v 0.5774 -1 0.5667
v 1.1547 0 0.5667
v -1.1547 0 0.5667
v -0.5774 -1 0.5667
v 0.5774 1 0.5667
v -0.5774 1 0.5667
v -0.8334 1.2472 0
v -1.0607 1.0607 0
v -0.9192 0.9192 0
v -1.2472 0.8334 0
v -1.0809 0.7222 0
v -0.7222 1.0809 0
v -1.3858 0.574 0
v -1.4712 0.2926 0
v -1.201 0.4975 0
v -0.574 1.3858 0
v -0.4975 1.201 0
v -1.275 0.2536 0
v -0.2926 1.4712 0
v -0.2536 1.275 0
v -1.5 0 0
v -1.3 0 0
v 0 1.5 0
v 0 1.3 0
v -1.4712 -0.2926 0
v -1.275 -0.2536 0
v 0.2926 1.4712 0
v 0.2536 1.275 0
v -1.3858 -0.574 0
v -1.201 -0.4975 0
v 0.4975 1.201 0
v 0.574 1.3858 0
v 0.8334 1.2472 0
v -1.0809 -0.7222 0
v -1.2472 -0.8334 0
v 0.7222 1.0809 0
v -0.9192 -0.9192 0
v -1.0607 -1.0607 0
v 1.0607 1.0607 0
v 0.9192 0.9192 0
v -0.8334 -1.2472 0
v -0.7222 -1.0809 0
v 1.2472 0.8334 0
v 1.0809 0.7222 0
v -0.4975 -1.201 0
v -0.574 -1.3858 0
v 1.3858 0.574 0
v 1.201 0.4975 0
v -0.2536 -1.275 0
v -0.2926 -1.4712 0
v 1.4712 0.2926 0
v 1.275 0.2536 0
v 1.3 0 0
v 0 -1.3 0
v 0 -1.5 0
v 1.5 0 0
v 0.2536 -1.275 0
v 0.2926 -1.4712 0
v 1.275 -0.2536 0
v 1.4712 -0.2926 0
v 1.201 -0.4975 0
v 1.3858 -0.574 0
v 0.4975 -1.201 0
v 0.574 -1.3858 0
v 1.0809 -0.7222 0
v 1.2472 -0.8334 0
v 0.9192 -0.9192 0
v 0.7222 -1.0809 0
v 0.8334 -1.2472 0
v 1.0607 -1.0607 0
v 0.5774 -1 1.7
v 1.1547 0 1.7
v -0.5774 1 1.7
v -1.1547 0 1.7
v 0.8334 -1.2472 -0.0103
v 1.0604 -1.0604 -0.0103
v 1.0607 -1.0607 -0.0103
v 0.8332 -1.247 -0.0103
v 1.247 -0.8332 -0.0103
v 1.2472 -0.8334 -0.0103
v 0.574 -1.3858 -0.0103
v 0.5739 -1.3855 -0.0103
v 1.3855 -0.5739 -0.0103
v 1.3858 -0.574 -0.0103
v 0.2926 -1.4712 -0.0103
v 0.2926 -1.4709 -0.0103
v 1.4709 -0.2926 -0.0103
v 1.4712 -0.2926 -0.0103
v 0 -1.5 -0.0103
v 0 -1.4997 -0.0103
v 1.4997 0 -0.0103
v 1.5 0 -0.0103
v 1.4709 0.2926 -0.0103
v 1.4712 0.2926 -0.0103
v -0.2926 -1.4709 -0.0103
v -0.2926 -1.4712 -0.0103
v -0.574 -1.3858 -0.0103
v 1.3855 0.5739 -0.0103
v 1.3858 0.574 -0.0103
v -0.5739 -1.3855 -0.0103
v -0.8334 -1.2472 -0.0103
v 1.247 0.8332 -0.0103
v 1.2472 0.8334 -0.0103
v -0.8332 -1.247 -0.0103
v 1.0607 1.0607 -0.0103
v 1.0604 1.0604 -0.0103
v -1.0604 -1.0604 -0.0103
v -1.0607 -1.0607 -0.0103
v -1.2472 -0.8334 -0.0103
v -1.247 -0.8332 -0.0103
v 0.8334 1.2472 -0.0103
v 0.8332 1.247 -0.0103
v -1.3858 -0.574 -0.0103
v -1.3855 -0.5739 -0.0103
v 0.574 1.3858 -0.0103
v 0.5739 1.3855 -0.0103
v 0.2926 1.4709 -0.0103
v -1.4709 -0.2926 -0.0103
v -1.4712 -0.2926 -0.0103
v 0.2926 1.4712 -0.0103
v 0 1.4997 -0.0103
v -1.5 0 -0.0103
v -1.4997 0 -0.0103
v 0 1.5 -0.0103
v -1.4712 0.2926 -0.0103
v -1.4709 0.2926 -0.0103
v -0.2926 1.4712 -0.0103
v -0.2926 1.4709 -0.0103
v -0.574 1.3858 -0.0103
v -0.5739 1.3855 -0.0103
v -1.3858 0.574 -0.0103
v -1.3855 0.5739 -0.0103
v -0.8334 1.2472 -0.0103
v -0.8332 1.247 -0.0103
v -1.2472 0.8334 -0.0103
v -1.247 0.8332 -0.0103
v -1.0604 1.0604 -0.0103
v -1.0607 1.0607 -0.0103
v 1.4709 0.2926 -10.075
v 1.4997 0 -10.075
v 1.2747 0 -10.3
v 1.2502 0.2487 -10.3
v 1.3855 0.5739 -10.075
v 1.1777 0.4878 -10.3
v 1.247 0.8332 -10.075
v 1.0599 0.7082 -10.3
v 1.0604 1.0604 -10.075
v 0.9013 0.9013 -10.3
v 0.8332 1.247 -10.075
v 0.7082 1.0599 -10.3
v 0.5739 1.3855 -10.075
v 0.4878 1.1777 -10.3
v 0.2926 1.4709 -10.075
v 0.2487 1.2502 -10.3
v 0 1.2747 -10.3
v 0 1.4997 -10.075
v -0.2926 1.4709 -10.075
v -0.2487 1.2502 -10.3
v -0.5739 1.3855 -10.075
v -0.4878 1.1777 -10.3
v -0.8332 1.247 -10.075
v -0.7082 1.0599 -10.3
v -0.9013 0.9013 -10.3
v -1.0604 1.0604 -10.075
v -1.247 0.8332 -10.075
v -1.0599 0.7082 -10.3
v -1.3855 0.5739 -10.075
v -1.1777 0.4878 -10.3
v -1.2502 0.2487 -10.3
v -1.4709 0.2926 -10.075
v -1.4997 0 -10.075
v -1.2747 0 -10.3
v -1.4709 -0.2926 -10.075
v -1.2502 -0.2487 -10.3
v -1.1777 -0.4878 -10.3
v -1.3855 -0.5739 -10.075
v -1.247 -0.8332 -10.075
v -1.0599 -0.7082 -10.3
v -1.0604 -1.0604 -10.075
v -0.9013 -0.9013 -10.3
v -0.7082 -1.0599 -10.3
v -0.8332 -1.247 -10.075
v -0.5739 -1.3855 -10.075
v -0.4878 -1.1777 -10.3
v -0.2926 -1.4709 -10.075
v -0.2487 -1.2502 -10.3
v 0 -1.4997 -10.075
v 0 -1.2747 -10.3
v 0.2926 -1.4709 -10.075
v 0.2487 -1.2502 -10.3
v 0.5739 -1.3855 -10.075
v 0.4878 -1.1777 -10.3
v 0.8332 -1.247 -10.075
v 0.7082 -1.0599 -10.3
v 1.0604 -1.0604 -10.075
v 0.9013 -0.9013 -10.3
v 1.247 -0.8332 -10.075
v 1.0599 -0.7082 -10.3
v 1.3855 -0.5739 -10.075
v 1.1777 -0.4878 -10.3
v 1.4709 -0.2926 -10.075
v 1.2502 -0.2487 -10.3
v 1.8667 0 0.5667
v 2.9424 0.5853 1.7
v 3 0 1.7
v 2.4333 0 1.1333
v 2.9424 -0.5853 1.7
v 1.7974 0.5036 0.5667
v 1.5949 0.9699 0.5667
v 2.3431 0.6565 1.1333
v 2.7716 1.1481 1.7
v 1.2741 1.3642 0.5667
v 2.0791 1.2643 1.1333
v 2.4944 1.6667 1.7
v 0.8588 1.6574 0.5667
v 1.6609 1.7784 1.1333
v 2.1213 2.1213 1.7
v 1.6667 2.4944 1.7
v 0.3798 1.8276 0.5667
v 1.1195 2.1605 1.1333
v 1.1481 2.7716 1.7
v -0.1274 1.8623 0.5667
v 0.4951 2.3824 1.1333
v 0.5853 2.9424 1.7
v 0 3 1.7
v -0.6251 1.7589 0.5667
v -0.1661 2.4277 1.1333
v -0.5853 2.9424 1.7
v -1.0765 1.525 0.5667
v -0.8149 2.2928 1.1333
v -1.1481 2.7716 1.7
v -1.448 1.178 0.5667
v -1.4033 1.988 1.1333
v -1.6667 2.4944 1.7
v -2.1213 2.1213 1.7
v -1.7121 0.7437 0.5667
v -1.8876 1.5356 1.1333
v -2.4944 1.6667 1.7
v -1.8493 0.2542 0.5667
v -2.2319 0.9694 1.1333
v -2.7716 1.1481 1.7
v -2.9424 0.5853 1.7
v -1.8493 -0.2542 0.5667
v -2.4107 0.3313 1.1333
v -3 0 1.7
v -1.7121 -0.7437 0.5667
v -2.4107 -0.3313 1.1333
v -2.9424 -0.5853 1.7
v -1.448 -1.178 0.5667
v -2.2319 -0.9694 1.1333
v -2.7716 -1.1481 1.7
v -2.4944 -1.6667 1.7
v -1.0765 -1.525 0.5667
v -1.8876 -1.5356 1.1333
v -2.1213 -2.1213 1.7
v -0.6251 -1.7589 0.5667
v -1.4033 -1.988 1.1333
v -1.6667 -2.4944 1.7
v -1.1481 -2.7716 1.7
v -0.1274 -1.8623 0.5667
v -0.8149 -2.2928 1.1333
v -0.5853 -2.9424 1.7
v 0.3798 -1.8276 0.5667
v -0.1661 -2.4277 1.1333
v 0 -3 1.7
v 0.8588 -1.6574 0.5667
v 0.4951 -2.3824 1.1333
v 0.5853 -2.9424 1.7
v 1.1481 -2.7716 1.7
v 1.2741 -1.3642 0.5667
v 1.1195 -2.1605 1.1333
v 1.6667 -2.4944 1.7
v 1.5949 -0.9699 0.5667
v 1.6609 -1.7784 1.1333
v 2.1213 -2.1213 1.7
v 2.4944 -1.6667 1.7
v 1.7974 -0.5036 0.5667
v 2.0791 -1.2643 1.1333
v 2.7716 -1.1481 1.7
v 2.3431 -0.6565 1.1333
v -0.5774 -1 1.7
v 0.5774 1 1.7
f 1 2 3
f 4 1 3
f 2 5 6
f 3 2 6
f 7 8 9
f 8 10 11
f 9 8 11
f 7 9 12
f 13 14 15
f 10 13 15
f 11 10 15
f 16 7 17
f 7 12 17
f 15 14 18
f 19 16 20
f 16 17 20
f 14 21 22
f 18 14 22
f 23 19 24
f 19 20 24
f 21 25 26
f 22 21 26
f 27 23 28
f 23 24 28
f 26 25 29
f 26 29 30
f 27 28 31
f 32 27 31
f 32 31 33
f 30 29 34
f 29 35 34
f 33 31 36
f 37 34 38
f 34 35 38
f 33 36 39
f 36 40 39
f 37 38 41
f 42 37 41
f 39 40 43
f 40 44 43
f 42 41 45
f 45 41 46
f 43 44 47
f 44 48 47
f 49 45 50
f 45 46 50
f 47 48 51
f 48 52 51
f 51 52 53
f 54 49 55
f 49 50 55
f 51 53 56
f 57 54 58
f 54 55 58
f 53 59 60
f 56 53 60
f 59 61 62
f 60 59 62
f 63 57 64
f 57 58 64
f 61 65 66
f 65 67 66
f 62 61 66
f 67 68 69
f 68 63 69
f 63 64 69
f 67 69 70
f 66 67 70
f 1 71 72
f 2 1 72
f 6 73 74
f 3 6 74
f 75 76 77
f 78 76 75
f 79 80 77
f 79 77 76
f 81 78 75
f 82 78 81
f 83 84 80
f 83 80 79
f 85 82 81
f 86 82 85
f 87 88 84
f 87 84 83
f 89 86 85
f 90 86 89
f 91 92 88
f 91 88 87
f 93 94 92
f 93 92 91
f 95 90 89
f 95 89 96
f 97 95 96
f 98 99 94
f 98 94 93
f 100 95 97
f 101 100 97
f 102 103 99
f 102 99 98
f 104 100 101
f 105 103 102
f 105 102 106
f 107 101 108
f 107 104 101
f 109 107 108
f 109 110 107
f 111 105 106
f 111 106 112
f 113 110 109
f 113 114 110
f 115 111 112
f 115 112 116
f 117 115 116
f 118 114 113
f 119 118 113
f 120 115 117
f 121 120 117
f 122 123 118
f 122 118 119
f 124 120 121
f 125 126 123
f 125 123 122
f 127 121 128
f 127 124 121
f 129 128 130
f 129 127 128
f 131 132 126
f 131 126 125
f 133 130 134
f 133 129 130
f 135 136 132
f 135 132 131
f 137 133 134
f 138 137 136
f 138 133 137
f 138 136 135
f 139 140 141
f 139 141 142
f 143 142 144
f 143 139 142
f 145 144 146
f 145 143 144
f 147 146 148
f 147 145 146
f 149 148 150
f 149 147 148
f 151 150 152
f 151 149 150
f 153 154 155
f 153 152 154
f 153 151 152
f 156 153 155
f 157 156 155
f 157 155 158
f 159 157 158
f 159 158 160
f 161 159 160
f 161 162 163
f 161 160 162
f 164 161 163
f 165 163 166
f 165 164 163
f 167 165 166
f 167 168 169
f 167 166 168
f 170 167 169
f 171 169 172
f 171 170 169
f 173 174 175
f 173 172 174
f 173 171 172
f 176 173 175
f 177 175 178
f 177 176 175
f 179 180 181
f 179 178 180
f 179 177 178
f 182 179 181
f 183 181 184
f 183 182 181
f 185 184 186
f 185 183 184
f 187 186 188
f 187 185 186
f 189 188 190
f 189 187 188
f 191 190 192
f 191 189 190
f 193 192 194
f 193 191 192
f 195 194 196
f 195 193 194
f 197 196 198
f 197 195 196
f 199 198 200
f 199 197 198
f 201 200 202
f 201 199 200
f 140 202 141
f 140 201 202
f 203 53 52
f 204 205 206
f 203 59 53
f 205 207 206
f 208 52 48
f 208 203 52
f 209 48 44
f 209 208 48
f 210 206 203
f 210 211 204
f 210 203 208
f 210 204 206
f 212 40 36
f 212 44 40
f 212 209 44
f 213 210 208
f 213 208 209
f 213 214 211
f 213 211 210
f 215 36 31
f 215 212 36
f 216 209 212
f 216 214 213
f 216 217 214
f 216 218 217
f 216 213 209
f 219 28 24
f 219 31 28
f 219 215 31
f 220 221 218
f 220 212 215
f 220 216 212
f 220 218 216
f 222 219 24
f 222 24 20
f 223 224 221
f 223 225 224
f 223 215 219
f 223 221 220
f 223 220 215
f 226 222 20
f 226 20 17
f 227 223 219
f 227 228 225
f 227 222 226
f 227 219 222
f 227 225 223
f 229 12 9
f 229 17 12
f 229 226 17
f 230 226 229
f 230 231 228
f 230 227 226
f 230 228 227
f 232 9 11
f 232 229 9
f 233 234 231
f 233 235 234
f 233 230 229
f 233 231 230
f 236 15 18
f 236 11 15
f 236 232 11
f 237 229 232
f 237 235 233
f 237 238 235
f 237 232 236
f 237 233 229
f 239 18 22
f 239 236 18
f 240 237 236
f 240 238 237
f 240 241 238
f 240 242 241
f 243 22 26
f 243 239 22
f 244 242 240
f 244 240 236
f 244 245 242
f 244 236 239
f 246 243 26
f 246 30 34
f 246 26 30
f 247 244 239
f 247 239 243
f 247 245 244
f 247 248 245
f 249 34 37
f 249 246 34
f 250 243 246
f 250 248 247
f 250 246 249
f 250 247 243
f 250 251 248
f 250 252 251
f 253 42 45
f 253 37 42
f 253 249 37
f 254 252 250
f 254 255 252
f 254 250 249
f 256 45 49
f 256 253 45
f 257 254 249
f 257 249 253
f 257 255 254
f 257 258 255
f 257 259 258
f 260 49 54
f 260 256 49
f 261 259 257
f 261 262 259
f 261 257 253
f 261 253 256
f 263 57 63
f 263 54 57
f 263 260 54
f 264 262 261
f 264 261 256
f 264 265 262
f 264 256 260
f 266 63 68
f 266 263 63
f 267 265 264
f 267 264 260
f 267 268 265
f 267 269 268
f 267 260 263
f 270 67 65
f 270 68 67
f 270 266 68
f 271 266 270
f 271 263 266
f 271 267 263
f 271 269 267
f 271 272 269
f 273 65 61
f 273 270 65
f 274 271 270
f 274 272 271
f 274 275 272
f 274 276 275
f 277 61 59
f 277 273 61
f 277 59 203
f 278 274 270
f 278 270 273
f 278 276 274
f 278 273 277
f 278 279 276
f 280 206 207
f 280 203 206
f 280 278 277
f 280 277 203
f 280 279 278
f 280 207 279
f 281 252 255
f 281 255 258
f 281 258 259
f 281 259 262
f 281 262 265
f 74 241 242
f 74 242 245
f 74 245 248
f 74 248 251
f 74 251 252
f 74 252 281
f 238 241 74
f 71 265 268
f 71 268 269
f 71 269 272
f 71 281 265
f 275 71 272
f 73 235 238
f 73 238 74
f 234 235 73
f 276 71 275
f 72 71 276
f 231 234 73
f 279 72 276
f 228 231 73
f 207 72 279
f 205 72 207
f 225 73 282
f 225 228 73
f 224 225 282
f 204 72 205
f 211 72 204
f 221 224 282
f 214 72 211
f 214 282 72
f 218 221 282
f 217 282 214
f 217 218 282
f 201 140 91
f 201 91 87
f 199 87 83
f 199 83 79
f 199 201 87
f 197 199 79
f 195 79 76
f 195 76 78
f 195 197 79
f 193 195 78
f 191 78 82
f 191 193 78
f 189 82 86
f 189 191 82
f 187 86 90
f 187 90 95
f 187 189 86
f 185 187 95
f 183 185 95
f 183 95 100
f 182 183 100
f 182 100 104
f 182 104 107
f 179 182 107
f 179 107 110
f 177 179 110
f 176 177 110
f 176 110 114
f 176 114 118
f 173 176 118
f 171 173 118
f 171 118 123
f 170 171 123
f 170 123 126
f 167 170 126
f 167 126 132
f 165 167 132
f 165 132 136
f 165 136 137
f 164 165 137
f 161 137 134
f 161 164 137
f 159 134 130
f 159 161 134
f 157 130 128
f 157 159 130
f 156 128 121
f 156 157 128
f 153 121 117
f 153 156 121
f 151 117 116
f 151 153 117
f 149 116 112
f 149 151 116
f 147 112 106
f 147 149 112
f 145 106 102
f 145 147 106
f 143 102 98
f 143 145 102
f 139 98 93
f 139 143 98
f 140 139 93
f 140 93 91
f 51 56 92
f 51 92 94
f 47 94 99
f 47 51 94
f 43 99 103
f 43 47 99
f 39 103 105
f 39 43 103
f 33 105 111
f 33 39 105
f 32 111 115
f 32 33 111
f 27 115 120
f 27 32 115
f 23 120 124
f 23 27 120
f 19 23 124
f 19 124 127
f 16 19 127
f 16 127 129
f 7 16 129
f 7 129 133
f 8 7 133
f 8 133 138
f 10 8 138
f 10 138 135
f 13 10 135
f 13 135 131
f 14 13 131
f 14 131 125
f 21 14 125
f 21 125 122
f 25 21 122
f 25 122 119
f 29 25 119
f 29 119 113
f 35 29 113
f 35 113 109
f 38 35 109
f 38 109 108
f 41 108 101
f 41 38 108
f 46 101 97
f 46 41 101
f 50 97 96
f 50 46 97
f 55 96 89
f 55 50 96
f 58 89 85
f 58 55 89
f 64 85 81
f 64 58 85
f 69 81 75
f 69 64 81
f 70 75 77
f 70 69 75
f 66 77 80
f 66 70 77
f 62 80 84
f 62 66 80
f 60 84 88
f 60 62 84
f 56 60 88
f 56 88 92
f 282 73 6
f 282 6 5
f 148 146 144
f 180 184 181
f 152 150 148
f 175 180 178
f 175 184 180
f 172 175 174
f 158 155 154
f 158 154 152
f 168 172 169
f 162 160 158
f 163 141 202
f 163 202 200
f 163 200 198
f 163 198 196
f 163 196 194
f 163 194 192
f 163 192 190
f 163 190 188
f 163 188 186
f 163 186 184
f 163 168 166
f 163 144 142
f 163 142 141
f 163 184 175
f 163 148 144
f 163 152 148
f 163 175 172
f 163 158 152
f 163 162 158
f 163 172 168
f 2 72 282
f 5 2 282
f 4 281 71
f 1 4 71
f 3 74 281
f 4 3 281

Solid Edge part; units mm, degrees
sketch "Sketch1" plane through (0, 0, 0) normal (0, 0, 1) x (1, 0, 0)
  circle A0 centre (0, 0) radius 3
  dimension "D1" = 6
extrude "Protrusion1" add sketch "Sketch1" along normal blind 1.7
sketch "Sketch2" plane through (0, 0, 0) normal (0, 0, -1) x (1, 0, 0)
  circle A0 centre (0, 0) radius 1.5
extrude "Protrusion2" add sketch "Sketch2" along normal blind 10.3
sketch "Sketch3" plane through (0, 0, -10.3) normal (0, 0, -1) x (1, 0, 0)
  circle A0 centre (0, 0) radius 1.4997
extrude "Cutout1" cut sketch "Sketch3" against normal blind 10.2897 flip side to cut
chamfer "Chamfer_1" distance 0.225 angle 45 1 edges at (-1.4997, 0, -10.3)
sketch "Sketch4" plane through (0, 0, 1.7) normal (0, 0, 1) x (1, 0, 0)
  line L0 (-0.5774, 1) -> (0.5774, 1)
  line L1 (1.1547, 0) -> (0.5774, 1)
  line L2 (0.5774, -1) -> (1.1547, 0)
  line L3 (-0.5774, -1) -> (0.5774, -1)
  line L4 (-1.1547, 0) -> (-0.5774, -1)
  line L5 (-0.5774, 1) -> (-1.1547, 0)
  dimension "D1" = 2
extrude "Cutout2" cut sketch "Sketch4" against normal blind 1.1333
sketch "Sketch5" plane through (0, 0, 0) normal (0, -1, 0) x (1, 0, 0)
  line L0 (3, 1.7) -> (1.3, 0)
  line L1 (1.3, 0) -> (3, 0)
  line L2 (3, 0) -> (3, 1.7)
revolve "RevolvedCutout1" cut sketch "Sketch5" angle 360 about axis through (0, 0, 14.0017) along (0, 0, -1)
properties part number "133795"
